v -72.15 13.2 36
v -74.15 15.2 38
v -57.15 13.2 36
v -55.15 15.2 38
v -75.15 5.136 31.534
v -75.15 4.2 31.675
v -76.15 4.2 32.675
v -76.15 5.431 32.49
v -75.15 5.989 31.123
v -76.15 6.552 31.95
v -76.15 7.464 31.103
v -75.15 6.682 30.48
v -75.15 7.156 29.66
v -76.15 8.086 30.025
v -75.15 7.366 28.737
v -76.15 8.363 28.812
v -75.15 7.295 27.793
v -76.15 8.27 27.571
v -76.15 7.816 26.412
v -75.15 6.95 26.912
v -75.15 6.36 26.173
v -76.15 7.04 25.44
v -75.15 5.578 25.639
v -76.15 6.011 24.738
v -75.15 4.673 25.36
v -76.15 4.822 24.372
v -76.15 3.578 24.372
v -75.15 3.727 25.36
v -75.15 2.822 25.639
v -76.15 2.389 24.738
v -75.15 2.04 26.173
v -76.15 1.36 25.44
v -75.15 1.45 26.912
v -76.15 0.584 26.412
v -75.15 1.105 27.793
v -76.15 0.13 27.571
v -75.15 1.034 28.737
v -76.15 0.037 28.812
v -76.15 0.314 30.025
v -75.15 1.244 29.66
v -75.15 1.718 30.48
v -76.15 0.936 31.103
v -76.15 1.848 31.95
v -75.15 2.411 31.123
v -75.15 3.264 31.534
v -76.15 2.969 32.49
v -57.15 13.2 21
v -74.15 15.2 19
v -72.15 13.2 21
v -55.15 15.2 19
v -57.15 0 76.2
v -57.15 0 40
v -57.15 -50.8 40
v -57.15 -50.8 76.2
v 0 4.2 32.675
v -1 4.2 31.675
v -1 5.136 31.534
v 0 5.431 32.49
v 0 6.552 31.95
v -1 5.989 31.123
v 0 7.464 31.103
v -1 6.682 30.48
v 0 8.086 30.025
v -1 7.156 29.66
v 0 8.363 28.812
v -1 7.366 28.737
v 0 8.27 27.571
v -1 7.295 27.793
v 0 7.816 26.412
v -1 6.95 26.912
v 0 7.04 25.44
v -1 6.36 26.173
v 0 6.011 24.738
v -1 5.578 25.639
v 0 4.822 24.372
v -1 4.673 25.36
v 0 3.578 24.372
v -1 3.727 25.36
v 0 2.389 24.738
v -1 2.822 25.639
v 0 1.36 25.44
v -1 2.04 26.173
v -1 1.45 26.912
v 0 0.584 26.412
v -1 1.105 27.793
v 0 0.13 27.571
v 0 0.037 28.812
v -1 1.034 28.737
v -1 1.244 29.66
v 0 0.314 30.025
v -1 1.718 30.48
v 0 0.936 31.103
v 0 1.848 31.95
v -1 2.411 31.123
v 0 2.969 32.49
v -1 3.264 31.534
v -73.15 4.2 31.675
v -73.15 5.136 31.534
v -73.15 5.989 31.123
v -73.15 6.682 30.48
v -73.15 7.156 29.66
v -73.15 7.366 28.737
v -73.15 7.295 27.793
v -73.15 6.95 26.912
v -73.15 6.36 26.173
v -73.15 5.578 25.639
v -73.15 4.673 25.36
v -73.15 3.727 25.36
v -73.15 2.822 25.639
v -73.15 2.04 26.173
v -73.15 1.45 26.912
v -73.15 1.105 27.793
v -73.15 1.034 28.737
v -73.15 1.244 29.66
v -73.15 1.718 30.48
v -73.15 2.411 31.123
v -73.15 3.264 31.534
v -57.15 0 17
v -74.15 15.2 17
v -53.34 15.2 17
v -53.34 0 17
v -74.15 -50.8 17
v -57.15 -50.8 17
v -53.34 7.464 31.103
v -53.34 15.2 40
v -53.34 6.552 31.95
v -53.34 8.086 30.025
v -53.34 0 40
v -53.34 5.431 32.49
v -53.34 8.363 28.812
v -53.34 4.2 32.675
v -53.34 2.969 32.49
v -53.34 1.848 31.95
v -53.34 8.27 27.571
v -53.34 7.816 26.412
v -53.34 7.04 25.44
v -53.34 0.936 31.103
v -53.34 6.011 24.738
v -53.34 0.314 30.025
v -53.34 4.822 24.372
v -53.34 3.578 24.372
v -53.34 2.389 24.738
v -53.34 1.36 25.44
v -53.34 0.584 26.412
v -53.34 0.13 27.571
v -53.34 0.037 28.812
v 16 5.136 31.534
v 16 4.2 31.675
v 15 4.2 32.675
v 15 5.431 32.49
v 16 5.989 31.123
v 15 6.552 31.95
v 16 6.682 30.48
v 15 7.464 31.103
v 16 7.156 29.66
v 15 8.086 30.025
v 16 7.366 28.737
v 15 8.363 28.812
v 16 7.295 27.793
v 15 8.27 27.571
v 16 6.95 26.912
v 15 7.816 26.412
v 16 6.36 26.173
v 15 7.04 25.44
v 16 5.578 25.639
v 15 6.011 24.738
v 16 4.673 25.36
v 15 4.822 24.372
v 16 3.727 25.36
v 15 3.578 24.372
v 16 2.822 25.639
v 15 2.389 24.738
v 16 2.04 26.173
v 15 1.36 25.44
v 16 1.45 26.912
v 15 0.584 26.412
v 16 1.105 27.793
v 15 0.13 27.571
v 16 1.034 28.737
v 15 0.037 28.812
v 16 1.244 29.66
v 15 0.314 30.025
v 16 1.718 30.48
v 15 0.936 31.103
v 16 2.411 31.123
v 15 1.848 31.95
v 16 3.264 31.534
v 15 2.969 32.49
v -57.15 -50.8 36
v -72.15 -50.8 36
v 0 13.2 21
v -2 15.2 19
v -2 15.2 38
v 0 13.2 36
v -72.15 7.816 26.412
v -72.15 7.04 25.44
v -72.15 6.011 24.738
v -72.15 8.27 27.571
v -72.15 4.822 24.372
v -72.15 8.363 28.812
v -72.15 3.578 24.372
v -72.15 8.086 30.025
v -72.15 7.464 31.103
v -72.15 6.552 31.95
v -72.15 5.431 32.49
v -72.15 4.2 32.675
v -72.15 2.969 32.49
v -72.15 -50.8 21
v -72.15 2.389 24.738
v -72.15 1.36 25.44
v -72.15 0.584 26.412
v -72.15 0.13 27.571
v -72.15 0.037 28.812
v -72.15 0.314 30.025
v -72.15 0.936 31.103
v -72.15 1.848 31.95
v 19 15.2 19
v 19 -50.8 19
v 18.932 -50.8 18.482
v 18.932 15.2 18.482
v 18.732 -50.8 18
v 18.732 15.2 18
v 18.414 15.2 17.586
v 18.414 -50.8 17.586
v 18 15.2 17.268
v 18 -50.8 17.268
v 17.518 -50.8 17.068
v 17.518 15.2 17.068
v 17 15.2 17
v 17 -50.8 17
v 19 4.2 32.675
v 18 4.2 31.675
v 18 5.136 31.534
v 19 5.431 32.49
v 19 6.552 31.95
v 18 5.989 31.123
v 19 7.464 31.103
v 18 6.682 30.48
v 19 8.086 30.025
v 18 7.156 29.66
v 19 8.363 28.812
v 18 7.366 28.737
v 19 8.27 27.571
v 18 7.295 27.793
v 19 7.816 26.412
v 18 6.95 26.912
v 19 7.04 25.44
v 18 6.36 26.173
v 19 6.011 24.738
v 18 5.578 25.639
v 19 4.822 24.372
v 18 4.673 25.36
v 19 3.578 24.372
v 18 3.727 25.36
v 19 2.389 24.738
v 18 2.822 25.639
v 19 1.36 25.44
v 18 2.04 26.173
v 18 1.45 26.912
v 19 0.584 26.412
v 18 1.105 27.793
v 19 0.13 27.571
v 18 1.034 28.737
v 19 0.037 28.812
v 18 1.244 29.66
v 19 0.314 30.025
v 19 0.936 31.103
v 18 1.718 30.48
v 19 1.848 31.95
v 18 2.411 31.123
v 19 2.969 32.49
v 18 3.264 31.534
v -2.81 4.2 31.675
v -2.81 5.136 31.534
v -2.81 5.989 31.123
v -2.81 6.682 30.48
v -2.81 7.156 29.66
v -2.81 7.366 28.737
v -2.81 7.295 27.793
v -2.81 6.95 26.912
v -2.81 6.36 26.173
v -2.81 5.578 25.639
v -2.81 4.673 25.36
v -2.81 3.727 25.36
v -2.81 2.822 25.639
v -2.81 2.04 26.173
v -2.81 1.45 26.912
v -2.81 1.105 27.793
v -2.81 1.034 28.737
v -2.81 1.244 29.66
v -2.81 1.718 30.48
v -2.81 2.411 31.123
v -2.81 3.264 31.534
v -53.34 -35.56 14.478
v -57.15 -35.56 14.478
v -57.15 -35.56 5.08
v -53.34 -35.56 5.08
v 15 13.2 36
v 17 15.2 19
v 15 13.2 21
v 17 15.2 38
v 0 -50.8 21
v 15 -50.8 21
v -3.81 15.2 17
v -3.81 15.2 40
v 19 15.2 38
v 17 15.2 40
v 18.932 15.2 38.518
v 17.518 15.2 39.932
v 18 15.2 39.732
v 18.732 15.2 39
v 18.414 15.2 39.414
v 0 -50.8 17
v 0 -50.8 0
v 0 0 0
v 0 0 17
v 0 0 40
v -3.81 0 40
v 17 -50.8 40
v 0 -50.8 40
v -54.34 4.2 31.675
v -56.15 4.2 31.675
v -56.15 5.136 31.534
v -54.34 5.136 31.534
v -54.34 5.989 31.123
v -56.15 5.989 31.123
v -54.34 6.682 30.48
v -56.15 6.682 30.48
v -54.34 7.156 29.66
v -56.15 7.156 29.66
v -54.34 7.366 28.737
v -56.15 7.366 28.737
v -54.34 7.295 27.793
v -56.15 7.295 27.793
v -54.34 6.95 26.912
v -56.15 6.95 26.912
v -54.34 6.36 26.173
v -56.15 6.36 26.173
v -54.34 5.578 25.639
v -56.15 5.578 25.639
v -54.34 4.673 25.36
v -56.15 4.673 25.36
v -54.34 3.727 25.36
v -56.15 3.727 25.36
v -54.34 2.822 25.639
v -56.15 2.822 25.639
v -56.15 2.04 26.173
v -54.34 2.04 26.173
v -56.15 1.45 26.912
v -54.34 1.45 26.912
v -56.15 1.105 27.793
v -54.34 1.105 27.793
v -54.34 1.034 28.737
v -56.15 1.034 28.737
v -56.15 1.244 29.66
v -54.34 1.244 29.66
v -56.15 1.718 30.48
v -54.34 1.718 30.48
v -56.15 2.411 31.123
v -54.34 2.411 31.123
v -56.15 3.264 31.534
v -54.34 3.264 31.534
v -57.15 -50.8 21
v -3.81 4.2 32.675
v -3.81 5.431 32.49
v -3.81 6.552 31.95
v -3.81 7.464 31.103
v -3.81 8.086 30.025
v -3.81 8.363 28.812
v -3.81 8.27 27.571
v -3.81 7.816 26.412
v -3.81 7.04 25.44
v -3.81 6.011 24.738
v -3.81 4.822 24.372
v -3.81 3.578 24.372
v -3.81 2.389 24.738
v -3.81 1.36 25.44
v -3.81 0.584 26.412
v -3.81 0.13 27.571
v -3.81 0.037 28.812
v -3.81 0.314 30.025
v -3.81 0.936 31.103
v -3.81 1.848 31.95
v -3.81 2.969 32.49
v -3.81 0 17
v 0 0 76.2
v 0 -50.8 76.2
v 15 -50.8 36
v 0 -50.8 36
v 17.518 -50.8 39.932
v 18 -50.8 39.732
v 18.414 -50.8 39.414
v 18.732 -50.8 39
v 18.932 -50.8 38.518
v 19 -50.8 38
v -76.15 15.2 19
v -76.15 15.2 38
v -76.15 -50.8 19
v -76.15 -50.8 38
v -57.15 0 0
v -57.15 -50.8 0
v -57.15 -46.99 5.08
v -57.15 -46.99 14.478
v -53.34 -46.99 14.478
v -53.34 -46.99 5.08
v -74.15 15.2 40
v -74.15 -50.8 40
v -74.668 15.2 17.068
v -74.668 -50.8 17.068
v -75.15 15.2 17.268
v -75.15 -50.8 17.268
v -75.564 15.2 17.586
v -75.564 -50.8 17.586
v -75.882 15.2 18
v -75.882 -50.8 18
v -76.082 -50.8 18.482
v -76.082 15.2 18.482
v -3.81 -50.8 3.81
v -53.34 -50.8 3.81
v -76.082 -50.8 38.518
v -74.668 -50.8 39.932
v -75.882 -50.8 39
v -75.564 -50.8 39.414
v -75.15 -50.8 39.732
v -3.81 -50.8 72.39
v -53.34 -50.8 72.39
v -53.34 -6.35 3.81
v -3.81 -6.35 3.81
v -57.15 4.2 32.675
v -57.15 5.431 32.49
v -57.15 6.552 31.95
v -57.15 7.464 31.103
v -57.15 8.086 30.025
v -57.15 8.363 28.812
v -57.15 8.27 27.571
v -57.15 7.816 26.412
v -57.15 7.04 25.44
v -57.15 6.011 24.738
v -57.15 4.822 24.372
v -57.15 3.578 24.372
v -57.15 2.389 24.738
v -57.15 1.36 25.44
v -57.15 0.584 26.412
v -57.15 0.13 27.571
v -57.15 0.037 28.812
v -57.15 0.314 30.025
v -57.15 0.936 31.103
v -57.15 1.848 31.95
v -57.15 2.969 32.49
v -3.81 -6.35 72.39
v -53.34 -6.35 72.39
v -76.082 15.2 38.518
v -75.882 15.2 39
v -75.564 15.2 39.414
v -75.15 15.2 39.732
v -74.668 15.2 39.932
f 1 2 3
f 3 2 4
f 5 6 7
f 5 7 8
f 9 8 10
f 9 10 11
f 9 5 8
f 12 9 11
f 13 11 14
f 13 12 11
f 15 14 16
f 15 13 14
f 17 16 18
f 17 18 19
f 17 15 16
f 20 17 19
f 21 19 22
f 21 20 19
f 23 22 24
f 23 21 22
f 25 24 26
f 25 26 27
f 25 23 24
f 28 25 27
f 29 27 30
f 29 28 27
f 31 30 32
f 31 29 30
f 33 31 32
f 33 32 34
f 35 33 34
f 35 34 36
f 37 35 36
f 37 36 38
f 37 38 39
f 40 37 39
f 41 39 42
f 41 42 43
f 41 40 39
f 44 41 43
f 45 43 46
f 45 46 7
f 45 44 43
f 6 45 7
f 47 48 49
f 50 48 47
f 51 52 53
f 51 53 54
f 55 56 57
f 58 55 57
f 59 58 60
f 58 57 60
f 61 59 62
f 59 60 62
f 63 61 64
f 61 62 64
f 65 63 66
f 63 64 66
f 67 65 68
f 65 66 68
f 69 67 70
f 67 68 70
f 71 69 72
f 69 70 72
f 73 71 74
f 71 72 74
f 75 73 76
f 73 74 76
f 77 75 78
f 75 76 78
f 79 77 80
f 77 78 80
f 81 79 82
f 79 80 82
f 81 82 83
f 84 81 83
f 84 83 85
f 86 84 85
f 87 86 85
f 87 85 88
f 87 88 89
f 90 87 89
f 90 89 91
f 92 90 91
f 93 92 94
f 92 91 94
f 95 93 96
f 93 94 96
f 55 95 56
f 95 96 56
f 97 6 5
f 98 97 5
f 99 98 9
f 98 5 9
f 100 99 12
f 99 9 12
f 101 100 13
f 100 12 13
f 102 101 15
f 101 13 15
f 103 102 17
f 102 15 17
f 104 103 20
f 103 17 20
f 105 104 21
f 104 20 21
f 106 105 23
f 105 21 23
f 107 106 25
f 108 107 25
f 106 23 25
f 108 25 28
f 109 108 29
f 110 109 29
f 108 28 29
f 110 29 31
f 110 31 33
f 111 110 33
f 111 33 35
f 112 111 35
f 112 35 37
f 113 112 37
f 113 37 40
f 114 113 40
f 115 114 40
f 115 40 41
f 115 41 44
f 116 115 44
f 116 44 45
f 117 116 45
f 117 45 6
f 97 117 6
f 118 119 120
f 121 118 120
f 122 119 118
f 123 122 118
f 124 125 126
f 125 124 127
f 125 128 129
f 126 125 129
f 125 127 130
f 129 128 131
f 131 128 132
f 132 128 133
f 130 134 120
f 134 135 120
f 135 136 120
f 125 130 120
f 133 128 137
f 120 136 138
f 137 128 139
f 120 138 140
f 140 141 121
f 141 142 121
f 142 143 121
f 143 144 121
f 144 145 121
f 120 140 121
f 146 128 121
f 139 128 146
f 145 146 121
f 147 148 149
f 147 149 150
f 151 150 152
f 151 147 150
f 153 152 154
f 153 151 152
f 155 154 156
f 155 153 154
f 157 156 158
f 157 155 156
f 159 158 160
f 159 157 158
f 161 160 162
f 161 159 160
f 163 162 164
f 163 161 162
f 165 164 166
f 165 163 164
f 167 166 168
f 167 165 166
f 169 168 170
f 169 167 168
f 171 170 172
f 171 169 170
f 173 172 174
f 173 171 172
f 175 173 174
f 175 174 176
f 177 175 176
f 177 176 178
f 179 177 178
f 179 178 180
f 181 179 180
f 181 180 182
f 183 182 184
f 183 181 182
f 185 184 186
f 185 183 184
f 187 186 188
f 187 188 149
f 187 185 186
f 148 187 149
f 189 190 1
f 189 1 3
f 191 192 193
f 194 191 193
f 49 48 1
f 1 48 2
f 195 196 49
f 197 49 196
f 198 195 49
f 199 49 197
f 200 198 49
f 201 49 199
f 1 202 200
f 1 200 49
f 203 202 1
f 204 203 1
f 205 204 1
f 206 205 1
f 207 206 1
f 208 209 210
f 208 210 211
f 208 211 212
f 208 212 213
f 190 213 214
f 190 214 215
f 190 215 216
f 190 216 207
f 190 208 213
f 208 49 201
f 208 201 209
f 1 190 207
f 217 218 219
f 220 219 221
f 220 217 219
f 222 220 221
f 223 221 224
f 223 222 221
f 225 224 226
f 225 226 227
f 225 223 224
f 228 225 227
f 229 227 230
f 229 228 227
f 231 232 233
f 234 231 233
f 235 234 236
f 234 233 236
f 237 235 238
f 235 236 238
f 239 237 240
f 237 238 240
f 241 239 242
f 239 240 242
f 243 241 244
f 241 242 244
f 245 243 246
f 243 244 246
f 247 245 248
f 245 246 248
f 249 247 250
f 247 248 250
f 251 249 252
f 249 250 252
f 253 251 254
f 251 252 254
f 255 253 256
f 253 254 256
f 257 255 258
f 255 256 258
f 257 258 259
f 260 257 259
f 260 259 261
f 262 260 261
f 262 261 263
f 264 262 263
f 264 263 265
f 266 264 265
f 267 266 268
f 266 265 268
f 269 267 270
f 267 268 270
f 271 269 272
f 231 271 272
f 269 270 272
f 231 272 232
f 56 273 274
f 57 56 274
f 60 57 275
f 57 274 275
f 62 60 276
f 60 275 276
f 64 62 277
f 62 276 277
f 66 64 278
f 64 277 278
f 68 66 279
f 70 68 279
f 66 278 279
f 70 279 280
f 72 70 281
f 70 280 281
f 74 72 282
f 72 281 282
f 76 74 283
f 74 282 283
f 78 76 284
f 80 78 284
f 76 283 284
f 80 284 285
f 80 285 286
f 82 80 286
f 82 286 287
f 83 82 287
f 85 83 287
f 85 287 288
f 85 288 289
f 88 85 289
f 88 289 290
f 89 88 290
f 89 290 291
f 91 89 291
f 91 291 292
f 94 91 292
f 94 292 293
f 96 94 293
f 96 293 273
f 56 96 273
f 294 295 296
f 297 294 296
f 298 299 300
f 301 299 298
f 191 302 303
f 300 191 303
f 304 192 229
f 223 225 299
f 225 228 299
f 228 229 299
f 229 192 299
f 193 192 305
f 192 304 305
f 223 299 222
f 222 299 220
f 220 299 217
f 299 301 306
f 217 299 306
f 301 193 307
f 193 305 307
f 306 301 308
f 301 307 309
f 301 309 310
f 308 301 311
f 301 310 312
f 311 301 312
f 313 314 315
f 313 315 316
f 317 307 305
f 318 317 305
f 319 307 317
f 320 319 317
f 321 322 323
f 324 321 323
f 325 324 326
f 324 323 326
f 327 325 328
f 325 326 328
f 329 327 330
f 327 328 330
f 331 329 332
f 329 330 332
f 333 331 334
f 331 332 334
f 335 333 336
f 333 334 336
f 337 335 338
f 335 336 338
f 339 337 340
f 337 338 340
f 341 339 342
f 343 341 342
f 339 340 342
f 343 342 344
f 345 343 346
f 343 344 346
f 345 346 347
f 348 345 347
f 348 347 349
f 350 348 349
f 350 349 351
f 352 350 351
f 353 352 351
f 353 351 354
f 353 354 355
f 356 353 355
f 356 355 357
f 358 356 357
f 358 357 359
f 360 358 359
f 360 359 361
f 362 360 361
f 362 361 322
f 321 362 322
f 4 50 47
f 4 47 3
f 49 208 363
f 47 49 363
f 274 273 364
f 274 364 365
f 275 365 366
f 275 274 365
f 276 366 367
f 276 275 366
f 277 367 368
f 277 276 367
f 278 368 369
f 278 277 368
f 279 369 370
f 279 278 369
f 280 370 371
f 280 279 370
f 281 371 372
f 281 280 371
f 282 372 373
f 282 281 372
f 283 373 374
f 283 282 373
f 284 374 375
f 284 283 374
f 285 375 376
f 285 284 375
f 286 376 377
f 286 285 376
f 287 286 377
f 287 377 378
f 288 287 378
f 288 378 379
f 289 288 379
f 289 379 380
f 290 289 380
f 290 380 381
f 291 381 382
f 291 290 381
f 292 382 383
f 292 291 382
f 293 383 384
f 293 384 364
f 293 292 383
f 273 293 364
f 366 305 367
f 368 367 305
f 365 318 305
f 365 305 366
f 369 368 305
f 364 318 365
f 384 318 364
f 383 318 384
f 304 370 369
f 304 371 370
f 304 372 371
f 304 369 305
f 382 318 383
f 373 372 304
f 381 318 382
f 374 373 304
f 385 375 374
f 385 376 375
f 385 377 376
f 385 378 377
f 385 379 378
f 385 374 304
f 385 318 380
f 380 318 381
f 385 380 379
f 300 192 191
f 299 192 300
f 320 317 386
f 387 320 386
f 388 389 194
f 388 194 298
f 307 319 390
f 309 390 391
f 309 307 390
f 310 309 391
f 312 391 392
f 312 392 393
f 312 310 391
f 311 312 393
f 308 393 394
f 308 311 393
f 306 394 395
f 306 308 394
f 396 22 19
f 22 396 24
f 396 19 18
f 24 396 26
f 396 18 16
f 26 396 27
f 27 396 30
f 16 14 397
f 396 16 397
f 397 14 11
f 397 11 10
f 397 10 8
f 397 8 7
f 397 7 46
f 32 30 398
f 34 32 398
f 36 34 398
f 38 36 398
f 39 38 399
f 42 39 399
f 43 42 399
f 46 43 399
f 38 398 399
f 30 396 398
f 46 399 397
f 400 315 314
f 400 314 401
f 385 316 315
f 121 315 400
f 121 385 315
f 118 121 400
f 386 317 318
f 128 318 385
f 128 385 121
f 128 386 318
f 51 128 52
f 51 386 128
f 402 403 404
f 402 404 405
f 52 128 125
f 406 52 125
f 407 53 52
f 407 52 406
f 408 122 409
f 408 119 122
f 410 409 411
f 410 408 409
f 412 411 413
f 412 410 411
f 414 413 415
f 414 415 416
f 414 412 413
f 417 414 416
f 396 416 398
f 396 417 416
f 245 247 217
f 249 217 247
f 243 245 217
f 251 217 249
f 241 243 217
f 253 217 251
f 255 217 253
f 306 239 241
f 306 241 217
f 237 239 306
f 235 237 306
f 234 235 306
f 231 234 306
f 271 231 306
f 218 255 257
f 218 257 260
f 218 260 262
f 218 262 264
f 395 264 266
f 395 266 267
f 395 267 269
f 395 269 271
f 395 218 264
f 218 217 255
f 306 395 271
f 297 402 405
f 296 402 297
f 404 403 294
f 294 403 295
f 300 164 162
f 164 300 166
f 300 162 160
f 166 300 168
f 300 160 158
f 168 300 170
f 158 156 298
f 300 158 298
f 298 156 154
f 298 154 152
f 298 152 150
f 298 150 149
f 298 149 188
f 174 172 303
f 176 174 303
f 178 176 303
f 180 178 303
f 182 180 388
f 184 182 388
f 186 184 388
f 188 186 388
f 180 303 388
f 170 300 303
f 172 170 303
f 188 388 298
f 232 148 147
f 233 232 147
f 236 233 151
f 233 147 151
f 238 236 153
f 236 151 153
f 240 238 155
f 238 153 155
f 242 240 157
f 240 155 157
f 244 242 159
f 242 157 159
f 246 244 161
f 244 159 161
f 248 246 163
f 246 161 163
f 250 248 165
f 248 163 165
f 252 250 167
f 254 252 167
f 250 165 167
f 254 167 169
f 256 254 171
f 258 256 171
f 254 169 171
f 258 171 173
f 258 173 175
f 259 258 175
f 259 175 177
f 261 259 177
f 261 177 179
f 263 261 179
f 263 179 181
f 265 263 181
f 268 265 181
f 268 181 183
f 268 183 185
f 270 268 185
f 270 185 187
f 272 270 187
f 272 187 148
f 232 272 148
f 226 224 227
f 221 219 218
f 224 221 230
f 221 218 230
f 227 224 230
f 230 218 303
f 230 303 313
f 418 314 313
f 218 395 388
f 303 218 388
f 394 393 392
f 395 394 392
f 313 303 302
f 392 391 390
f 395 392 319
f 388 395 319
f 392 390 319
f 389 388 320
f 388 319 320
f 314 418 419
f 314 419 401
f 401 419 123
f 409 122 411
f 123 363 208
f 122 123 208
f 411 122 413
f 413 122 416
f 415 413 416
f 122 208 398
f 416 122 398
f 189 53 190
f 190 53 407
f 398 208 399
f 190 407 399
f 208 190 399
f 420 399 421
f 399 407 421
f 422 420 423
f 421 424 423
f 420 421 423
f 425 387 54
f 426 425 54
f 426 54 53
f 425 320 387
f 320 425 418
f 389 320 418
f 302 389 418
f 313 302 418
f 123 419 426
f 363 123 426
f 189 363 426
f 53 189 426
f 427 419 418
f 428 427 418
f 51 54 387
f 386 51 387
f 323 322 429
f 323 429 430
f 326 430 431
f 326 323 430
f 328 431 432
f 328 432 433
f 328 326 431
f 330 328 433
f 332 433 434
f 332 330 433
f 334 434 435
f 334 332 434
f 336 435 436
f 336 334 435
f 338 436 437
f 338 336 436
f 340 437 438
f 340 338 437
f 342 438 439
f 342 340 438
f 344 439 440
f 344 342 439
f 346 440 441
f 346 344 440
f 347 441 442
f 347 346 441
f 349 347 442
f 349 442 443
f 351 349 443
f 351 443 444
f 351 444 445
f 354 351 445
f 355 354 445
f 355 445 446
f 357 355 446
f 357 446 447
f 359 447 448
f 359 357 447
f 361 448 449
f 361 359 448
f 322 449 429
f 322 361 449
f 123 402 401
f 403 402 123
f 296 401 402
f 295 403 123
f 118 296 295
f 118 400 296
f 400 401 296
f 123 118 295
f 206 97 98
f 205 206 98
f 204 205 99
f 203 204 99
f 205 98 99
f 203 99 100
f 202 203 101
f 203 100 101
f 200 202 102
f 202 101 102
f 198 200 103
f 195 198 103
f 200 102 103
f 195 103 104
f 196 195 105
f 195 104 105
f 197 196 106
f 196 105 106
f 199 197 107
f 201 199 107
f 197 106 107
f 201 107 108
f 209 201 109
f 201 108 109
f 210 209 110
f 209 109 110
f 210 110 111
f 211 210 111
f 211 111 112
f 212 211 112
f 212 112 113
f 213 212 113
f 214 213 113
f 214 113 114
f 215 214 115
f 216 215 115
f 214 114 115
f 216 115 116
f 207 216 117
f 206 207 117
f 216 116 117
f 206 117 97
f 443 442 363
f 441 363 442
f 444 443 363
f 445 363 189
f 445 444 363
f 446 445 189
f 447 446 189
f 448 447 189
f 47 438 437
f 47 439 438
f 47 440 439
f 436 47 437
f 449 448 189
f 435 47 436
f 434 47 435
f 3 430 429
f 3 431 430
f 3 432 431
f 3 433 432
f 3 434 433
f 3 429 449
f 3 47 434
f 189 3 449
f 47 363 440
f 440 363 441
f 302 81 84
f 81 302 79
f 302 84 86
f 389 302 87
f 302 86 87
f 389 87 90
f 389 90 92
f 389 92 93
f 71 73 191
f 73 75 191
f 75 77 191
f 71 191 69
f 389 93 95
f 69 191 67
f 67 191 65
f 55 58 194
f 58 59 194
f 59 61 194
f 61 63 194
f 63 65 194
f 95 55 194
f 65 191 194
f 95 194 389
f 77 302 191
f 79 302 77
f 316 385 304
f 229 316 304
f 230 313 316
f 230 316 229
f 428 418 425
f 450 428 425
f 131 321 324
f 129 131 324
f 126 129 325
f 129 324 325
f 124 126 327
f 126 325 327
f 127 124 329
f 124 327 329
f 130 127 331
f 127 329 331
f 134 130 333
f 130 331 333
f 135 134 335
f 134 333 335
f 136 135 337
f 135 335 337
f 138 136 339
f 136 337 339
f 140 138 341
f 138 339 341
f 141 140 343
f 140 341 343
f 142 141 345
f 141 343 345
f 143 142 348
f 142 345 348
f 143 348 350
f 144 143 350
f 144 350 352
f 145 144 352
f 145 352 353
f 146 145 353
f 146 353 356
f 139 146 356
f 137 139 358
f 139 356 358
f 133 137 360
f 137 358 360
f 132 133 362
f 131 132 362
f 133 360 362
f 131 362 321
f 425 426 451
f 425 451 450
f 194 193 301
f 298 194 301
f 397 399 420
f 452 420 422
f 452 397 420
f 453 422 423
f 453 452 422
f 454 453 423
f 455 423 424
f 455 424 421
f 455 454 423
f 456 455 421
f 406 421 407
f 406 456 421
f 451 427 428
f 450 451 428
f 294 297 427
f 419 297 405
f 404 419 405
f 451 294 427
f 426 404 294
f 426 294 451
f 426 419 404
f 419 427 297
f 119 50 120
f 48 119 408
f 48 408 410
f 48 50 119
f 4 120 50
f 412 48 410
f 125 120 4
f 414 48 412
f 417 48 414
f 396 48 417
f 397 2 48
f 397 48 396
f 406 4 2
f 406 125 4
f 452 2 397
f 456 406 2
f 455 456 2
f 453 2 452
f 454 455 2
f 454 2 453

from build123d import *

# Parameters (mm, degrees)
SKETCH3_W                         = 57.15
SKETCH3_H                         = 76.2
BOSS_EXTRUDE2_DEPTH               = 50.8
SKETCH4_W                         = 49.53
SKETCH4_H                         = 68.58
CUT_EXTRUDE2_DEPTH                = 44.45
CUT_EXTRUDE3_REACH                = 109.95
SKETCH5_W                         = 9.398
SKETCH5_H                         = 11.43
MOTOR_MOUNTING_SHAPE_DEPTH        = 57.15
MOTOR_MOUNTING_HOLES_REACH        = 131.428
SKETCH8_R                         = 1.6
SKETCH7_W                         = 7.62
SKETCH7_H                         = 29.66
TRAY_SUPPORT_MOUNTING_SHAPE_DEPTH = 44.45
SKETCH9_W                         = 15
SKETCH9_H                         = 15
BOSS_EXTRUDE3_DEPTH               = 66
SKETCH10_R                        = 3.175
CUT_EXTRUDE4_DEPTH                = 133.062873284
CHAMFER1_SIZE                     = 2
FILLET1_R                         = 2
CHAMFER2_SIZE                     = 1
CUT_EXTRUDE5_DEPTH                = 120.104586394


with BuildPart() as part:
    # Sketch3 → Boss-Extrude2 (new body)
    with BuildSketch(Plane(origin=(0, 0, 0), x_dir=(-1, 0, 0), z_dir=(0, 1, 0))):
        with Locations((28.575, 38.1)):
            Rectangle(SKETCH3_W, SKETCH3_H)
    extrude(amount=-BOSS_EXTRUDE2_DEPTH)

    # Sketch4 → Cut-Extrude2 (cut)
    with BuildSketch(Plane.XZ.offset(50.8)):
        with Locations((-28.575, 38.1)):
            Rectangle(SKETCH4_W, SKETCH4_H)
    extrude(amount=-CUT_EXTRUDE2_DEPTH, mode=Mode.SUBTRACT)

    # Sketch5 → Cut-Extrude3 (cut, up to next)
    with BuildSketch(Plane(origin=(-57.15, 0, 0), x_dir=(0, 0, -1), z_dir=(1, 0, 0)), mode=Mode.PRIVATE) as cut_extrude3_sk1:
        with Locations((-9.779, -41.275)):
            Rectangle(SKETCH5_W, SKETCH5_H)
    cut_extrude3_tool1 = extrude(cut_extrude3_sk1.sketch, amount=CUT_EXTRUDE3_REACH, mode=Mode.PRIVATE) & part.part
    add(cut_extrude3_tool1.solids().sort_by_distance((-57.15, -41.275, 9.779))[0], mode=Mode.SUBTRACT)

    # Sketch6 → Motor Mounting Shape (add)
    with BuildSketch(Plane.ZY.offset(57.15)):
        Polygon((46.54, 0), (46.54, 36.83), (0, 36.83), (0, 34.29), (44, 34.29), (44, 0), align=None)
    extrude(amount=-MOTOR_MOUNTING_SHAPE_DEPTH)

    # Sketch8 → Motor-Mounting-Holes (cut, up to next)
    with BuildSketch(Plane(origin=(0, 36.83, 0), x_dir=(1, 0, 0), z_dir=(0, 1, 0)), mode=Mode.PRIVATE) as motor_mounting_holes_sk1:
        with Locations(Location((-44.075, -7.77, 0), (0, 0, 270))):
            Circle(SKETCH8_R)
    motor_mounting_holes_tool1 = extrude(motor_mounting_holes_sk1.sketch, amount=-MOTOR_MOUNTING_HOLES_REACH, mode=Mode.PRIVATE) & part.part
    # Sketch8 → Motor-Mounting-Holes (cut, up to next)
    with BuildSketch(Plane(origin=(0, 36.83, 0), x_dir=(1, 0, 0), z_dir=(0, 1, 0)), mode=Mode.PRIVATE) as motor_mounting_holes_sk2:
        with Locations(Location((-13.075, -7.77, 0), (0, 0, 270))):
            Circle(SKETCH8_R)
    motor_mounting_holes_tool2 = extrude(motor_mounting_holes_sk2.sketch, amount=-MOTOR_MOUNTING_HOLES_REACH, mode=Mode.PRIVATE) & part.part
    # Sketch8 → Motor-Mounting-Holes (cut, up to next)
    with BuildSketch(Plane(origin=(0, 36.83, 0), x_dir=(1, 0, 0), z_dir=(0, 1, 0)), mode=Mode.PRIVATE) as motor_mounting_holes_sk3:
        with Locations(Location((-13.075, -38.77, 0), (0, 0, 270))):
            Circle(SKETCH8_R)
    motor_mounting_holes_tool3 = extrude(motor_mounting_holes_sk3.sketch, amount=-MOTOR_MOUNTING_HOLES_REACH, mode=Mode.PRIVATE) & part.part
    # Sketch8 → Motor-Mounting-Holes (cut, up to next)
    with BuildSketch(Plane(origin=(0, 36.83, 0), x_dir=(1, 0, 0), z_dir=(0, 1, 0)), mode=Mode.PRIVATE) as motor_mounting_holes_sk4:
        with Locations(Location((-44.075, -38.77, 0), (0, 0, 270))):
            Circle(SKETCH8_R)
    motor_mounting_holes_tool4 = extrude(motor_mounting_holes_sk4.sketch, amount=-MOTOR_MOUNTING_HOLES_REACH, mode=Mode.PRIVATE) & part.part
    # Sketch8 → Motor-Mounting-Holes (cut, up to next)
    with BuildSketch(Plane(origin=(0, 36.83, 0), x_dir=(1, 0, 0), z_dir=(0, 1, 0)), mode=Mode.PRIVATE) as motor_mounting_holes_sk5:
        with BuildLine():
            Line((-37.465, 0), (-19.685, 0))
            Line((-19.685, 0), (-19.685, -23.27))
            ThreePointArc((-19.685, -23.27), (-28.575, -32.16), (-37.465, -23.27))
            Line((-37.465, -23.27), (-37.465, 0))
        make_face()
    motor_mounting_holes_tool5 = extrude(motor_mounting_holes_sk5.sketch, amount=-MOTOR_MOUNTING_HOLES_REACH, mode=Mode.PRIVATE) & part.part
    add(motor_mounting_holes_tool1.solids().sort_by_distance((-44.075, 36.83, 7.77))[0], mode=Mode.SUBTRACT)
    add(motor_mounting_holes_tool2.solids().sort_by_distance((-13.075, 36.83, 7.77))[0], mode=Mode.SUBTRACT)
    add(motor_mounting_holes_tool3.solids().sort_by_distance((-13.075, 36.83, 38.77))[0], mode=Mode.SUBTRACT)
    add(motor_mounting_holes_tool4.solids().sort_by_distance((-44.075, 36.83, 38.77))[0], mode=Mode.SUBTRACT)
    add(motor_mounting_holes_tool5.solids().sort_by_distance((-28.575, 36.83, 15.191166))[0], mode=Mode.SUBTRACT)

    # Sketch7 → Tray Support Mounting Shape (add)
    with BuildSketch(Plane(origin=(0, 0, 0), x_dir=(1, 0, 0), z_dir=(0, 1, 0))):
        with Locations((-42.545, -61.37)):
            Rectangle(SKETCH7_W, SKETCH7_H)
        with Locations((-14.605, -61.37)):
            Rectangle(SKETCH7_W, SKETCH7_H)
    extrude(amount=TRAY_SUPPORT_MOUNTING_SHAPE_DEPTH)

    # Sketch9 → Boss-Extrude3 (add)
    # profile 1 of 2: a face of its own
    with BuildSketch(Plane.XZ.offset(50.8)):
        Polygon((0, 40), (-3.81, 40), (-3.81, 17), (0, 17), (19, 17), (19, 40), align=None)
        with Locations((7.5, 28.5)):
            Rectangle(SKETCH9_W, SKETCH9_H, mode=Mode.SUBTRACT)
    # profile 2 of 2: a face of its own
    with BuildSketch(Plane.XZ.offset(50.8)):
        Polygon((-53.34, 17), (-57.15, 17), (-76.15, 17), (-76.15, 40), (-57.15, 40), (-53.34, 40), align=None)
        with Locations((-64.65, 28.5)):
            Rectangle(SKETCH9_W, SKETCH9_H, mode=Mode.SUBTRACT)
    extrude(amount=-BOSS_EXTRUDE3_DEPTH)

    # Sketch10 → Cut-Extrude4 (cut, through all)
    with BuildSketch(Plane.ZY.offset(76.15)):
        with Locations((28.5, 4.2)):
            Circle(SKETCH10_R)
    extrude(amount=-CUT_EXTRUDE4_DEPTH, mode=Mode.SUBTRACT)

    # Chamfer1
    chamfer1_edges = [part.edges().sort_by_distance(p)[0] for p in [
        (0, 15.2, 28.5),
        (7.5, 15.2, 36),
        (15, 15.2, 28.5),
        (7.5, 15.2, 21),
        (-64.65, 15.2, 36),
        (-72.15, 15.2, 28.5),
        (-64.65, 15.2, 21),
        (-57.15, 15.2, 28.5),
    ]]
    chamfer(chamfer1_edges, length=CHAMFER1_SIZE)

    # Fillet1
    fillet1_edges = [part.edges().sort_by_distance(p)[0] for p in [
        (19, -17.8, 17),
        (19, -17.8, 40),
        (-76.15, -17.8, 40),
        (-76.15, -17.8, 17),
    ]]
    fillet(fillet1_edges, radius=FILLET1_R)

    # Chamfer2
    chamfer2_edges = [part.edges().sort_by_distance(p)[0] for p in [
        (-57.15, 4.2, 25.325),
        (15, 4.2, 25.325),
        (0, 4.2, 25.325),
        (-3.81, 4.2, 25.325),
        (-53.34, 4.2, 25.325),
        (-72.15, 4.2, 25.325),
        (19, 4.2, 25.325),
        (-76.15, 4.2, 25.325),
    ]]
    chamfer(chamfer2_edges, length=CHAMFER2_SIZE)

    # Sketch11 → Cut-Extrude5 (cut, through all)
    with BuildSketch(Plane(origin=(0, 0, 0), x_dir=(0, 0, -1), z_dir=(1, 0, 0))):
        Polygon((-44, 0), (-44, 34.29), (0, 34.29), (0, 51.599341861), (-81.196180942, 51.599341861), (-81.196180942, 0), align=None)
    extrude(amount=-CUT_EXTRUDE5_DEPTH, mode=Mode.SUBTRACT)


solid = part.part
